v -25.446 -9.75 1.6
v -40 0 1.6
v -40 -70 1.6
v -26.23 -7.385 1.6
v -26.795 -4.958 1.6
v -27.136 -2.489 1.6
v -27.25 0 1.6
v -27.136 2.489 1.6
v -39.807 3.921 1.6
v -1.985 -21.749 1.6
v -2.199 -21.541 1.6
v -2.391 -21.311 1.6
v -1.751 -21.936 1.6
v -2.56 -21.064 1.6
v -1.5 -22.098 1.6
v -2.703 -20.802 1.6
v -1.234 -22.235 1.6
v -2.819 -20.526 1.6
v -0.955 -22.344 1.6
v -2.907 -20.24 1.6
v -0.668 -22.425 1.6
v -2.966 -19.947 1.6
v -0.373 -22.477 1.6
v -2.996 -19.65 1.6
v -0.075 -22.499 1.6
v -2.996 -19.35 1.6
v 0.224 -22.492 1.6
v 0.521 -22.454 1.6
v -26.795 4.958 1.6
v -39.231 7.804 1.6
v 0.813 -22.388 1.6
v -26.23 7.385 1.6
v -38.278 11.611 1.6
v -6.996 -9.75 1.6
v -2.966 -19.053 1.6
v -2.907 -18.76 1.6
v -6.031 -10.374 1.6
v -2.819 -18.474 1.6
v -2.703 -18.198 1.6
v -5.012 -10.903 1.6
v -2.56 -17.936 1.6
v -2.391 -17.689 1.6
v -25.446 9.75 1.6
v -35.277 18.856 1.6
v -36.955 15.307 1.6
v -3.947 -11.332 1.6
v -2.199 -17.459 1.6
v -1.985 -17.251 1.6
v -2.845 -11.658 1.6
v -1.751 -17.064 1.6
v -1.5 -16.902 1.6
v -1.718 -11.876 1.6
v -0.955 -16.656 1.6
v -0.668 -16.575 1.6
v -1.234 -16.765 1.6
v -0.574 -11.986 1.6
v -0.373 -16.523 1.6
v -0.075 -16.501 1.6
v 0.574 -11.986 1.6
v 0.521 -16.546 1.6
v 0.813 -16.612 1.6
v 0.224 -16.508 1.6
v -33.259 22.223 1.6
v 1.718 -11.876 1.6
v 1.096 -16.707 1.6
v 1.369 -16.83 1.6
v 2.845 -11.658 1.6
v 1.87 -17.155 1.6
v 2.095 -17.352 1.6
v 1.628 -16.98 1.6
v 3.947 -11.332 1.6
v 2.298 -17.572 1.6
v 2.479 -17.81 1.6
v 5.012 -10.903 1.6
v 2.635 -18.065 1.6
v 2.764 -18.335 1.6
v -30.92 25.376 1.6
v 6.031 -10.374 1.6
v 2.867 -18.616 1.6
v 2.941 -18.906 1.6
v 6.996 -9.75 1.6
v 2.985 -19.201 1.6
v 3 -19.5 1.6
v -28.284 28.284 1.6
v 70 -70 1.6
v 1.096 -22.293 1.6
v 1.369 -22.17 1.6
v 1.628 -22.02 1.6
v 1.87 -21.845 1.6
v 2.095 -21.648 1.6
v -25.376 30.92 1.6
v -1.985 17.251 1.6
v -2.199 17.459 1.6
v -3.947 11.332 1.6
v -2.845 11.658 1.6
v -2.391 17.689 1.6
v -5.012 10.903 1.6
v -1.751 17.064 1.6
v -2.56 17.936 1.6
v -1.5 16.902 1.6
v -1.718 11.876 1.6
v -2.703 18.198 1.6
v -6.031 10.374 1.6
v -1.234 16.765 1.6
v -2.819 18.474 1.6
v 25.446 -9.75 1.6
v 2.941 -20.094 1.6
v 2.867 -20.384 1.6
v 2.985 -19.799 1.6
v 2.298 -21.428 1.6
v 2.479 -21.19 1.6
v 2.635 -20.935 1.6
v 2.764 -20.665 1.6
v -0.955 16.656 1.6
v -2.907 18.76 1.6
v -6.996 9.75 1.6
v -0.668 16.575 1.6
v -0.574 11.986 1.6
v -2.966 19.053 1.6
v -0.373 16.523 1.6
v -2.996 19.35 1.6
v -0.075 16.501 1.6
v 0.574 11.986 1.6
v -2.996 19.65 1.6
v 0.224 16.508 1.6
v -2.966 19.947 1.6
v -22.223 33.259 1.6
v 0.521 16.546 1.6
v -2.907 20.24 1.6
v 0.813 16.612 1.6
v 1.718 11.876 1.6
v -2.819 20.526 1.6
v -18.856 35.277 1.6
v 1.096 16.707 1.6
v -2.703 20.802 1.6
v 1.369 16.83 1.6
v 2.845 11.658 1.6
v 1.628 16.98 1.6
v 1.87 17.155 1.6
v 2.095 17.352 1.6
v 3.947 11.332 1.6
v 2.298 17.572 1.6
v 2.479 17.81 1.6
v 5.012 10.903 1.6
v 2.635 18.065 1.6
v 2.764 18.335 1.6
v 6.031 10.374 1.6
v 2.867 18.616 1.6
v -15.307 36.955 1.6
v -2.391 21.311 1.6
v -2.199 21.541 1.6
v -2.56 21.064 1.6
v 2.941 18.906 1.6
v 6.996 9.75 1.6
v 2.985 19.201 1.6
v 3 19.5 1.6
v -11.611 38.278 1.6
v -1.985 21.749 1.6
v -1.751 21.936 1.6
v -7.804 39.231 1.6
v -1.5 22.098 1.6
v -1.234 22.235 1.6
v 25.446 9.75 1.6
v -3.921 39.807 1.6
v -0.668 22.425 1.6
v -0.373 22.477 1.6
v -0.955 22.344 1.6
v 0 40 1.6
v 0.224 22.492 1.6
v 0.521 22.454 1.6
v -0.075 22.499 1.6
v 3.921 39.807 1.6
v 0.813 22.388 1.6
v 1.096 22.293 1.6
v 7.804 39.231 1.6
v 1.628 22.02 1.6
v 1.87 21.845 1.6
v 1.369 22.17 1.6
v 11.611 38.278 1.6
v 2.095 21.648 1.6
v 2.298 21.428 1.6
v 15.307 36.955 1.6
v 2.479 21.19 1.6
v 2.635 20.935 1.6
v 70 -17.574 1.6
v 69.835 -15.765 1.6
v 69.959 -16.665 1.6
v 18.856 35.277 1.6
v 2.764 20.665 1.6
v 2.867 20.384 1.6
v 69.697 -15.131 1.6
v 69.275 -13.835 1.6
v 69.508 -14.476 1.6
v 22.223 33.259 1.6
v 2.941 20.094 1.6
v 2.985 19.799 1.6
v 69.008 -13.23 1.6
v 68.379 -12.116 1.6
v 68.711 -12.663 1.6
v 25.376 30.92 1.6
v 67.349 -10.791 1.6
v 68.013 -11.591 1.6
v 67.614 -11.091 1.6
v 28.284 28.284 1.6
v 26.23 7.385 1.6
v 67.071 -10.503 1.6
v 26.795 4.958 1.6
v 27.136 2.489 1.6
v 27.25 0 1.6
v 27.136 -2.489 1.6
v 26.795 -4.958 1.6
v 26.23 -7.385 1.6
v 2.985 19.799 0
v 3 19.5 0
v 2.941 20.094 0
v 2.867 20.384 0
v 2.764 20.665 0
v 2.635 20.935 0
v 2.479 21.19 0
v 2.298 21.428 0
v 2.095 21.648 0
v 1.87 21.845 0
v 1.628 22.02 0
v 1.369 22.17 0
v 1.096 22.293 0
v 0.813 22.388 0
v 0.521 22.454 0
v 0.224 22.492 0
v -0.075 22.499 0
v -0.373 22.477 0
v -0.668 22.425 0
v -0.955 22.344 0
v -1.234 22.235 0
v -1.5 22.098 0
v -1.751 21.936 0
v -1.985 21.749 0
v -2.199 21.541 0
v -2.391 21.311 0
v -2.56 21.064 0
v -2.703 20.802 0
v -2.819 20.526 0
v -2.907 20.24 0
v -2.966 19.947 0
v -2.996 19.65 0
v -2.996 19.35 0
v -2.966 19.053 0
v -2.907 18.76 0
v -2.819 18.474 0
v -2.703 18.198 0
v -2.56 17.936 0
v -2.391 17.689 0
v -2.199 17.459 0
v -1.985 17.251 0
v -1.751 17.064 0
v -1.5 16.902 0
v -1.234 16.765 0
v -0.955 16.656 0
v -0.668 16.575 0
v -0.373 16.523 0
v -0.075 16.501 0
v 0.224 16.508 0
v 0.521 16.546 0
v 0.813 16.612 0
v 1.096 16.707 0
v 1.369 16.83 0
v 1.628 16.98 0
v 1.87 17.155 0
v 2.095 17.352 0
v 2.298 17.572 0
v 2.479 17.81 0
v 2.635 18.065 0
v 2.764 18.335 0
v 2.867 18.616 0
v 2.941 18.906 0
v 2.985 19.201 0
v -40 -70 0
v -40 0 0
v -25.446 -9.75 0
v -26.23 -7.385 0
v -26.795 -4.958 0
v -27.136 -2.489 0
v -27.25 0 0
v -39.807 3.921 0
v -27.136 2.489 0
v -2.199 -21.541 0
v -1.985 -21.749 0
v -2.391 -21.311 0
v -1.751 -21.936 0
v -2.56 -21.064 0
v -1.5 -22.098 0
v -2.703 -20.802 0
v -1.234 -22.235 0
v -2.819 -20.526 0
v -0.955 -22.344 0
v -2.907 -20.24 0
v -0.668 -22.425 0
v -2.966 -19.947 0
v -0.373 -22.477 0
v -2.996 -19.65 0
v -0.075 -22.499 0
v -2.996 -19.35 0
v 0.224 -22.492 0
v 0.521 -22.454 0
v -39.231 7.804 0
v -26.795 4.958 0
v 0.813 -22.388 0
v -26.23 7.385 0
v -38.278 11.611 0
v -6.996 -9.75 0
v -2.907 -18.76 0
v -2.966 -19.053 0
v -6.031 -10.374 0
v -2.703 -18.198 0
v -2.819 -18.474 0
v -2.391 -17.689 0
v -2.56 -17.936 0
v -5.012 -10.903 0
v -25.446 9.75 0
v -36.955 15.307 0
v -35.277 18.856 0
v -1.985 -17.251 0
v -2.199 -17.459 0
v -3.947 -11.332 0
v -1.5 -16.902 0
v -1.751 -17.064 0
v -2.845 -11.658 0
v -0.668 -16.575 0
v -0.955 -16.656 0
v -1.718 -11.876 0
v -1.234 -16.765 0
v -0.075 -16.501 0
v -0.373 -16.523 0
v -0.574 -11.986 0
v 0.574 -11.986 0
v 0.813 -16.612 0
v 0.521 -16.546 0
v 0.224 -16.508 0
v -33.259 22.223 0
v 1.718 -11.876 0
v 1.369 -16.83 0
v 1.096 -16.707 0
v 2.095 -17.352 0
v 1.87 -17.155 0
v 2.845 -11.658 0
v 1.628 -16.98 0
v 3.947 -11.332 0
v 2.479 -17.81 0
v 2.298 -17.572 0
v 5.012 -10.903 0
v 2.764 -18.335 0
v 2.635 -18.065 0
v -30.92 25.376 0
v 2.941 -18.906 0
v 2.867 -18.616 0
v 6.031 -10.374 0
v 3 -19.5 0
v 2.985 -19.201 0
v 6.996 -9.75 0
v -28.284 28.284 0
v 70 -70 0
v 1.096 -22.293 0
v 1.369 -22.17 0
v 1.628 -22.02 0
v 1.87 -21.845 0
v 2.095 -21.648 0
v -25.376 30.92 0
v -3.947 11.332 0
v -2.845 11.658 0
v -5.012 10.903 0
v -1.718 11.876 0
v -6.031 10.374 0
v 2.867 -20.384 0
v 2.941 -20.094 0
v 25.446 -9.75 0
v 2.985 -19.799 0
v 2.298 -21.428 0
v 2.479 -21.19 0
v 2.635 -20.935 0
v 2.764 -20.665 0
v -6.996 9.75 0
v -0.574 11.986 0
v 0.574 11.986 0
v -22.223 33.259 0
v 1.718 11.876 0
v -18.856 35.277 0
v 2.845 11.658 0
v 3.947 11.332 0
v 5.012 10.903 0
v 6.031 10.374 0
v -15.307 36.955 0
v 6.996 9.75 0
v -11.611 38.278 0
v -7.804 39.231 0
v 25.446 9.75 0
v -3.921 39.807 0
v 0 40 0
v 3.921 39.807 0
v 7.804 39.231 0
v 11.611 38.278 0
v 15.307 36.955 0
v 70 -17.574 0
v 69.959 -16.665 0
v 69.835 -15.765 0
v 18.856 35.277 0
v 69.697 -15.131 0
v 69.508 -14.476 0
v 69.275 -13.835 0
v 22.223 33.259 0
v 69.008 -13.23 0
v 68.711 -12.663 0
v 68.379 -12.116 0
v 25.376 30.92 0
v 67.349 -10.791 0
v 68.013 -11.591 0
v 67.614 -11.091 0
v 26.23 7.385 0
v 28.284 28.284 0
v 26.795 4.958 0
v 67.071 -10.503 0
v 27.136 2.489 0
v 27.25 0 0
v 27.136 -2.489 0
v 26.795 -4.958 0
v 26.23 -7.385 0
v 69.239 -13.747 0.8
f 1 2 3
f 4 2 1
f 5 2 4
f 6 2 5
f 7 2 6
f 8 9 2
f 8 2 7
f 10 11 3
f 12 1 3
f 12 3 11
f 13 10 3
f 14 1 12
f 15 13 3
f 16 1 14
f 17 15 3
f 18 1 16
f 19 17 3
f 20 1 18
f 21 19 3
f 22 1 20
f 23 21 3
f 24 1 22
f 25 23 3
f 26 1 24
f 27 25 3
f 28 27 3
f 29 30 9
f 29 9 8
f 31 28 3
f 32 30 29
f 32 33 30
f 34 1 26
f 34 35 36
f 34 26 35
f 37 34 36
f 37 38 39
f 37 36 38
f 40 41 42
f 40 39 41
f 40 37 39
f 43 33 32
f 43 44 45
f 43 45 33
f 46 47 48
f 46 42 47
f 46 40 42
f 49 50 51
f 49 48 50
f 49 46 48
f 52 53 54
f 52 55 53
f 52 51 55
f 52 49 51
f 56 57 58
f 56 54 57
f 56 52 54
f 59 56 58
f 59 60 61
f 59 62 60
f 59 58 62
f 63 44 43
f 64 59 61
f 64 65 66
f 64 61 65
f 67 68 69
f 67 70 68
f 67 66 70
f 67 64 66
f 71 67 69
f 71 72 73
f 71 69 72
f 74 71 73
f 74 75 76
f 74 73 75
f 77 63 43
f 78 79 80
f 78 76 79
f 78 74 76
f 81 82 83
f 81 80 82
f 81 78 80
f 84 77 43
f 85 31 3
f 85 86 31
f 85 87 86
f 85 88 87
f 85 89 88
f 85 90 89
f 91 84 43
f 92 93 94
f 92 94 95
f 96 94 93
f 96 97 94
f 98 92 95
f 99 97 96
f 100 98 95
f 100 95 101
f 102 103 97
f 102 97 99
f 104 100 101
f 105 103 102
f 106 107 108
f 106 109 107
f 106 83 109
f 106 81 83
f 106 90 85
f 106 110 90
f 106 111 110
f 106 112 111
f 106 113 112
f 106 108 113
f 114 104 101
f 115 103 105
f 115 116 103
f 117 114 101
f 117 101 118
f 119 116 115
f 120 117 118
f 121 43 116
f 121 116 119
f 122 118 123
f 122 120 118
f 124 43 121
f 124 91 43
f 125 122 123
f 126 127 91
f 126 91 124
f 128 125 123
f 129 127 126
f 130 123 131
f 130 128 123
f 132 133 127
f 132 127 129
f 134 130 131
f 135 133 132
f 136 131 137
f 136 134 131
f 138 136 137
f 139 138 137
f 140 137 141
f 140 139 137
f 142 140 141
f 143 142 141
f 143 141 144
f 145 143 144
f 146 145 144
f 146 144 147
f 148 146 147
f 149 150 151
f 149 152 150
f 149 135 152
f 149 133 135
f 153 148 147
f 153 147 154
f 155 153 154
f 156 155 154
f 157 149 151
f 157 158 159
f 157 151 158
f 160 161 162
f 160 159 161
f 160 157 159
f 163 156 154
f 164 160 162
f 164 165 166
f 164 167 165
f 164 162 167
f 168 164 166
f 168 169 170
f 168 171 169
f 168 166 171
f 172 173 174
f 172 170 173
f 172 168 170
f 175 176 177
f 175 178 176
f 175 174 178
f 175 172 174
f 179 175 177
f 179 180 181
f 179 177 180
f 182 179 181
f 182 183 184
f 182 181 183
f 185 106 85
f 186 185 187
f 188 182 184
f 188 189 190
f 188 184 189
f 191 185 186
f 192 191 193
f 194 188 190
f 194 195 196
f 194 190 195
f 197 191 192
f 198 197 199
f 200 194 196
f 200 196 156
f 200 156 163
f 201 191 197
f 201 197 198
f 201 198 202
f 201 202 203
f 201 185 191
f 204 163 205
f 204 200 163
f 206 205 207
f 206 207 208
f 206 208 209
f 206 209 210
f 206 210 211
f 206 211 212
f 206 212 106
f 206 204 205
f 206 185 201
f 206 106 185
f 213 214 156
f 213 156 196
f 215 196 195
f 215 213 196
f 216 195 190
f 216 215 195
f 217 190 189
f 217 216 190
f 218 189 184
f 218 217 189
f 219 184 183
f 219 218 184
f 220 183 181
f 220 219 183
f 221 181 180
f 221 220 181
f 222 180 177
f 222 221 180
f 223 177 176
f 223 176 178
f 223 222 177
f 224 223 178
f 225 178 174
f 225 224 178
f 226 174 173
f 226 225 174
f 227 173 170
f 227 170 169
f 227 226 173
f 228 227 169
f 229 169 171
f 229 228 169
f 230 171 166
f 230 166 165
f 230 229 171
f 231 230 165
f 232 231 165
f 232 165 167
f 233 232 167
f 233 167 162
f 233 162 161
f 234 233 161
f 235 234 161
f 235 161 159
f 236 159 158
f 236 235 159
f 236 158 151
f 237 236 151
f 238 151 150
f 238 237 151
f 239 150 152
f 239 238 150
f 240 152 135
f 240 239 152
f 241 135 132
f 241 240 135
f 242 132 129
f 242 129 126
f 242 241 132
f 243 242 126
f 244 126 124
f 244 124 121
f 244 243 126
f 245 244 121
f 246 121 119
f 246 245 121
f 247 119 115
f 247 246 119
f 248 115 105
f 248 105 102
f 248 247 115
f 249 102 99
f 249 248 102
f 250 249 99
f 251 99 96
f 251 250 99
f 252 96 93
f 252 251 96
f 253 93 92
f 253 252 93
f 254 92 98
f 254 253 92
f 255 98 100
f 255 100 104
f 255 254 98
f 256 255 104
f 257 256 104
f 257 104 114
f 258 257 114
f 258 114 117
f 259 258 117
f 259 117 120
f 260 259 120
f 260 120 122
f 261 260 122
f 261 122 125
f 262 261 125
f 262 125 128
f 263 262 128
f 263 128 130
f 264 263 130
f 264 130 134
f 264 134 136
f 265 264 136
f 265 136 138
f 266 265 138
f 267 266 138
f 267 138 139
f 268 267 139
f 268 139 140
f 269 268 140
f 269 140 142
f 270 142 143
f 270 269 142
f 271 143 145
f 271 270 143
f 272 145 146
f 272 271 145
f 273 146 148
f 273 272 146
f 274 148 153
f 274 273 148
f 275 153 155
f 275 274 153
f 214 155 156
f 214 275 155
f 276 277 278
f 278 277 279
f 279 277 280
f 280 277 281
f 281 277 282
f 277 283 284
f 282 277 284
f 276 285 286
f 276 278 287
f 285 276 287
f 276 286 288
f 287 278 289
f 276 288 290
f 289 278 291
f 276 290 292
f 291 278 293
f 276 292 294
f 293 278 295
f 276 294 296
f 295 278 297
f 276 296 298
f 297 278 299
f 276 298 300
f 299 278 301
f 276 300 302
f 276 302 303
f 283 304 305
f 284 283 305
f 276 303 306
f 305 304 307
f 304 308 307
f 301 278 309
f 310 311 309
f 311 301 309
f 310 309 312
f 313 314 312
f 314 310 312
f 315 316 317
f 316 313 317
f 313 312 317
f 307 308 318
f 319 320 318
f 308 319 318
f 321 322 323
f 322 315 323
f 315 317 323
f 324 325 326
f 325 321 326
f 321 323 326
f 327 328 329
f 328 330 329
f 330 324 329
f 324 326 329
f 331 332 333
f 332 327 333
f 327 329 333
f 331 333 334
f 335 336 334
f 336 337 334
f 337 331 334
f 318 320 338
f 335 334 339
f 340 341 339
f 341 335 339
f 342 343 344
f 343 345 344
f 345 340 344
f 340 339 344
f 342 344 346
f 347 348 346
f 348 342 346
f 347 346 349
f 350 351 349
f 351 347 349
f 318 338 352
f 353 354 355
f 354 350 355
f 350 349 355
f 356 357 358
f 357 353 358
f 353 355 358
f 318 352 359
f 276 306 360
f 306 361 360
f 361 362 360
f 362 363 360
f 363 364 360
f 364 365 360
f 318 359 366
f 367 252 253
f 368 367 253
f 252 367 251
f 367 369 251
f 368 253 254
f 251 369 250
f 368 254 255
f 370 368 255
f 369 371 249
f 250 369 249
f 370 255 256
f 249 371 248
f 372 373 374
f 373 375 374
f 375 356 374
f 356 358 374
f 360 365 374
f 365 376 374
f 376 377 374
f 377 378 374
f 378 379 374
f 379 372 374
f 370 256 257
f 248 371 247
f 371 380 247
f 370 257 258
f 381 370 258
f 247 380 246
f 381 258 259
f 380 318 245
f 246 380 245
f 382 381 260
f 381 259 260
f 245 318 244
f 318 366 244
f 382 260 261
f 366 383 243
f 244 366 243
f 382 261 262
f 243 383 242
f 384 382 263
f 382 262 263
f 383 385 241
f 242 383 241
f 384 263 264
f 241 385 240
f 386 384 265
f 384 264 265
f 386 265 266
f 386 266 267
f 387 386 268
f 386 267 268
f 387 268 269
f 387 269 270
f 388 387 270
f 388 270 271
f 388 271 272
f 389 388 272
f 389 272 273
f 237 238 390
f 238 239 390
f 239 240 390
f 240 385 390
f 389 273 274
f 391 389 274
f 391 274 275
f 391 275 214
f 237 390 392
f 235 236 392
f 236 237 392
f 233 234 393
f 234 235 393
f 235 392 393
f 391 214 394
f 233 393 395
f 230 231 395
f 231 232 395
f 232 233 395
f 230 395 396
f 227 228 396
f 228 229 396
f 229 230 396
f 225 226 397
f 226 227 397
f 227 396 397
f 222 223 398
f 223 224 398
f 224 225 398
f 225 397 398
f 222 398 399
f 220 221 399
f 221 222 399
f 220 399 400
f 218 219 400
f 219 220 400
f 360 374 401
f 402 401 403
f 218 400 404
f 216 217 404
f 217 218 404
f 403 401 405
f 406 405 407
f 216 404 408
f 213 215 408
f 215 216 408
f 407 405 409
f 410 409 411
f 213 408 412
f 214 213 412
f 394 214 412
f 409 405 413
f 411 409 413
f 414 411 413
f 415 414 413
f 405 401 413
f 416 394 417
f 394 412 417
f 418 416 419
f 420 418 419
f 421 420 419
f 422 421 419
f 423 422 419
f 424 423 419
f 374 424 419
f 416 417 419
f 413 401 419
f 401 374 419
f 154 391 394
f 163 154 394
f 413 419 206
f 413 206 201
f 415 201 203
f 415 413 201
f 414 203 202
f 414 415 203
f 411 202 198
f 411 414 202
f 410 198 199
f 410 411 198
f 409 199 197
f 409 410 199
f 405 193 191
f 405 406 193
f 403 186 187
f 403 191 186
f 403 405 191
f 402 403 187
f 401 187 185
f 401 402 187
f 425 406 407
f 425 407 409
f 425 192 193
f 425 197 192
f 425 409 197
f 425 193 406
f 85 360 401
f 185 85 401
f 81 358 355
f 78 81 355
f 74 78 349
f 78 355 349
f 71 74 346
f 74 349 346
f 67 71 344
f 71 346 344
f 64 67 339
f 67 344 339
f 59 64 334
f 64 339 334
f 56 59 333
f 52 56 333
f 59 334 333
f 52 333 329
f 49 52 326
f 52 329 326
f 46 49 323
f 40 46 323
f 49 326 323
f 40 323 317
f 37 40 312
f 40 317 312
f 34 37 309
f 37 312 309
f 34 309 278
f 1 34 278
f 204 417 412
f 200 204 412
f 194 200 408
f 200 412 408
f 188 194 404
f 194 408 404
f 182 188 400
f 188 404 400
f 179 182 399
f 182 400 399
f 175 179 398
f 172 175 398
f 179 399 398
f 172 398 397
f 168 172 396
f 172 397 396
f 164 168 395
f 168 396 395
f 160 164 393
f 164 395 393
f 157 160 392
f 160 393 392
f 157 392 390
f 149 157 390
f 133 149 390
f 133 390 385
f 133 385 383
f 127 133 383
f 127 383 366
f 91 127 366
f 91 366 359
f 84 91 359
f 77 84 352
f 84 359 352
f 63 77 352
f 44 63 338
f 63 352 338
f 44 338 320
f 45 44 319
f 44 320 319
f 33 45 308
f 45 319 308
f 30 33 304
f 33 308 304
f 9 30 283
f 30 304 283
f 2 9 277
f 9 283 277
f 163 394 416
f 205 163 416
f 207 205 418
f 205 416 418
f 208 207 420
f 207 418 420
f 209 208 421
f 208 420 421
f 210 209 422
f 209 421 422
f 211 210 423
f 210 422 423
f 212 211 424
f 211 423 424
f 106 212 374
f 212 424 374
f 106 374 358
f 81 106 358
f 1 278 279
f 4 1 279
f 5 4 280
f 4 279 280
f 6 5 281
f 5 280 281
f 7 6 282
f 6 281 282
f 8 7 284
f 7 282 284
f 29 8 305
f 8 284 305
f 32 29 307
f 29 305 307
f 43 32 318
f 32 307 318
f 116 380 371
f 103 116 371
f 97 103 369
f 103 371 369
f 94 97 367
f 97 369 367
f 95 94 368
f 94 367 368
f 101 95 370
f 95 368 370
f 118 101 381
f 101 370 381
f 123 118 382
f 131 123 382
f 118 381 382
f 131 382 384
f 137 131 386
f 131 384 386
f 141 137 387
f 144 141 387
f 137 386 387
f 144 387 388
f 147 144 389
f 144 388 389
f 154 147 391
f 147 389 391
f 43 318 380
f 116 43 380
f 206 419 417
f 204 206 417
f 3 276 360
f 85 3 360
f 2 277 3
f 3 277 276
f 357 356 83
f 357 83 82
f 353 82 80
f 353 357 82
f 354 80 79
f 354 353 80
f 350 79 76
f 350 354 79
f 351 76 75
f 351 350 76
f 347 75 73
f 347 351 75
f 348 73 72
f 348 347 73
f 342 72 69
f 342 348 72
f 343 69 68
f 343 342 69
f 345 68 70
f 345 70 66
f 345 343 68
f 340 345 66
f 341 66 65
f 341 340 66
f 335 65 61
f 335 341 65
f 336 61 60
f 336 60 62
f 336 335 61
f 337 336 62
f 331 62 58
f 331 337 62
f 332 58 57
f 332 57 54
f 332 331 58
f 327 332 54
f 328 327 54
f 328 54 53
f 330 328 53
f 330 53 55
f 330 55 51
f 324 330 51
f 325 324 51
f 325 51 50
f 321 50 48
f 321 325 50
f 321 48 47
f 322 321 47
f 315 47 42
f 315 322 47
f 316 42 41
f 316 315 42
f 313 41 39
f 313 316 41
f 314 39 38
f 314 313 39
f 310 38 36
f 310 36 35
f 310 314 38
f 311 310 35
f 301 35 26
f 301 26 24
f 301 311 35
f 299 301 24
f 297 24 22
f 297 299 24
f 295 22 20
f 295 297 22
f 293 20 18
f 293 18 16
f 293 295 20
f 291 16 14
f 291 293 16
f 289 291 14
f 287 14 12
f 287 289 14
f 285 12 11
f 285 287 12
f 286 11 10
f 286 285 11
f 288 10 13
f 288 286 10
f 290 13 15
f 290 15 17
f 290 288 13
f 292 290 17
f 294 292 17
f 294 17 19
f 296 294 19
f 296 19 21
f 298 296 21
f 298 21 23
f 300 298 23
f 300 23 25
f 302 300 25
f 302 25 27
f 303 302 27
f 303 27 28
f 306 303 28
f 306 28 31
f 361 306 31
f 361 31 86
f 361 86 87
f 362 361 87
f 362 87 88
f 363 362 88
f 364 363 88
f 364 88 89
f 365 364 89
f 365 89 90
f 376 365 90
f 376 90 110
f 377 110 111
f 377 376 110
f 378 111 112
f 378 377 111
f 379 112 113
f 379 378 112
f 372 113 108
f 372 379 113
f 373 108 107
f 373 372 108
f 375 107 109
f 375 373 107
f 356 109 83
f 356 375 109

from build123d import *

# Parameters (mm, degrees)
SKETCH_2_R      = 3
EXTRUDE_2_DEPTH = 1.6
FILLET_1_R      = 10


with BuildPart() as part:
    # ｽｹｯﾁ2 → ﾎﾞｽ - 押し出し2 (new body)
    with BuildSketch(Plane.XY):
        with BuildLine():
            ThreePointArc((28.284271247, 28.284271247), (-15.307337295, 36.9551813), (-40, 0))
            Line((-40, 0), (-40, -70))
            Line((-40, -70), (70, -70))
            Line((70, -70), (70, -13.431457505))
            Line((70, -13.431457505), (28.284271247, 28.284271247))
        make_face()
        with Locations((0, -19.5)):
            Circle(SKETCH_2_R, mode=Mode.SUBTRACT)
        with BuildLine():
            Line((-6.99553429, -9.75), (-12.241706376, -9.75))
            Line((-12.241706376, -9.75), (-25.4460213, -9.75))
            ThreePointArc((-25.4460213, -9.75), (-27.25, 0), (-25.4460213, 9.75))
            Line((-25.4460213, 9.75), (-12.241706376, 9.75))
            Line((-12.241706376, 9.75), (-6.99553429, 9.75))
            ThreePointArc((-6.99553429, 9.75), (0, 12), (6.99553429, 9.75))
            Line((6.99553429, 9.75), (25.4460213, 9.75))
            ThreePointArc((25.4460213, 9.75), (27.25, 0), (25.4460213, -9.75))
            Line((25.4460213, -9.75), (9.75, -9.75))
            Line((9.75, -9.75), (6.99553429, -9.75))
            ThreePointArc((6.99553429, -9.75), (0, -12), (-6.99553429, -9.75))
        make_face(mode=Mode.SUBTRACT)
        with Locations((0, 19.5)):
            Circle(SKETCH_2_R, mode=Mode.SUBTRACT)
    extrude(amount=EXTRUDE_2_DEPTH)

    # 可変ﾌｨﾚｯﾄ1
    fillet_1_edges = [part.edges().sort_by_distance(p)[0] for p in [
        (70, -13.431457505, 0.8),
    ]]
    fillet(fillet_1_edges, radius=FILLET_1_R)


solid = part.part
